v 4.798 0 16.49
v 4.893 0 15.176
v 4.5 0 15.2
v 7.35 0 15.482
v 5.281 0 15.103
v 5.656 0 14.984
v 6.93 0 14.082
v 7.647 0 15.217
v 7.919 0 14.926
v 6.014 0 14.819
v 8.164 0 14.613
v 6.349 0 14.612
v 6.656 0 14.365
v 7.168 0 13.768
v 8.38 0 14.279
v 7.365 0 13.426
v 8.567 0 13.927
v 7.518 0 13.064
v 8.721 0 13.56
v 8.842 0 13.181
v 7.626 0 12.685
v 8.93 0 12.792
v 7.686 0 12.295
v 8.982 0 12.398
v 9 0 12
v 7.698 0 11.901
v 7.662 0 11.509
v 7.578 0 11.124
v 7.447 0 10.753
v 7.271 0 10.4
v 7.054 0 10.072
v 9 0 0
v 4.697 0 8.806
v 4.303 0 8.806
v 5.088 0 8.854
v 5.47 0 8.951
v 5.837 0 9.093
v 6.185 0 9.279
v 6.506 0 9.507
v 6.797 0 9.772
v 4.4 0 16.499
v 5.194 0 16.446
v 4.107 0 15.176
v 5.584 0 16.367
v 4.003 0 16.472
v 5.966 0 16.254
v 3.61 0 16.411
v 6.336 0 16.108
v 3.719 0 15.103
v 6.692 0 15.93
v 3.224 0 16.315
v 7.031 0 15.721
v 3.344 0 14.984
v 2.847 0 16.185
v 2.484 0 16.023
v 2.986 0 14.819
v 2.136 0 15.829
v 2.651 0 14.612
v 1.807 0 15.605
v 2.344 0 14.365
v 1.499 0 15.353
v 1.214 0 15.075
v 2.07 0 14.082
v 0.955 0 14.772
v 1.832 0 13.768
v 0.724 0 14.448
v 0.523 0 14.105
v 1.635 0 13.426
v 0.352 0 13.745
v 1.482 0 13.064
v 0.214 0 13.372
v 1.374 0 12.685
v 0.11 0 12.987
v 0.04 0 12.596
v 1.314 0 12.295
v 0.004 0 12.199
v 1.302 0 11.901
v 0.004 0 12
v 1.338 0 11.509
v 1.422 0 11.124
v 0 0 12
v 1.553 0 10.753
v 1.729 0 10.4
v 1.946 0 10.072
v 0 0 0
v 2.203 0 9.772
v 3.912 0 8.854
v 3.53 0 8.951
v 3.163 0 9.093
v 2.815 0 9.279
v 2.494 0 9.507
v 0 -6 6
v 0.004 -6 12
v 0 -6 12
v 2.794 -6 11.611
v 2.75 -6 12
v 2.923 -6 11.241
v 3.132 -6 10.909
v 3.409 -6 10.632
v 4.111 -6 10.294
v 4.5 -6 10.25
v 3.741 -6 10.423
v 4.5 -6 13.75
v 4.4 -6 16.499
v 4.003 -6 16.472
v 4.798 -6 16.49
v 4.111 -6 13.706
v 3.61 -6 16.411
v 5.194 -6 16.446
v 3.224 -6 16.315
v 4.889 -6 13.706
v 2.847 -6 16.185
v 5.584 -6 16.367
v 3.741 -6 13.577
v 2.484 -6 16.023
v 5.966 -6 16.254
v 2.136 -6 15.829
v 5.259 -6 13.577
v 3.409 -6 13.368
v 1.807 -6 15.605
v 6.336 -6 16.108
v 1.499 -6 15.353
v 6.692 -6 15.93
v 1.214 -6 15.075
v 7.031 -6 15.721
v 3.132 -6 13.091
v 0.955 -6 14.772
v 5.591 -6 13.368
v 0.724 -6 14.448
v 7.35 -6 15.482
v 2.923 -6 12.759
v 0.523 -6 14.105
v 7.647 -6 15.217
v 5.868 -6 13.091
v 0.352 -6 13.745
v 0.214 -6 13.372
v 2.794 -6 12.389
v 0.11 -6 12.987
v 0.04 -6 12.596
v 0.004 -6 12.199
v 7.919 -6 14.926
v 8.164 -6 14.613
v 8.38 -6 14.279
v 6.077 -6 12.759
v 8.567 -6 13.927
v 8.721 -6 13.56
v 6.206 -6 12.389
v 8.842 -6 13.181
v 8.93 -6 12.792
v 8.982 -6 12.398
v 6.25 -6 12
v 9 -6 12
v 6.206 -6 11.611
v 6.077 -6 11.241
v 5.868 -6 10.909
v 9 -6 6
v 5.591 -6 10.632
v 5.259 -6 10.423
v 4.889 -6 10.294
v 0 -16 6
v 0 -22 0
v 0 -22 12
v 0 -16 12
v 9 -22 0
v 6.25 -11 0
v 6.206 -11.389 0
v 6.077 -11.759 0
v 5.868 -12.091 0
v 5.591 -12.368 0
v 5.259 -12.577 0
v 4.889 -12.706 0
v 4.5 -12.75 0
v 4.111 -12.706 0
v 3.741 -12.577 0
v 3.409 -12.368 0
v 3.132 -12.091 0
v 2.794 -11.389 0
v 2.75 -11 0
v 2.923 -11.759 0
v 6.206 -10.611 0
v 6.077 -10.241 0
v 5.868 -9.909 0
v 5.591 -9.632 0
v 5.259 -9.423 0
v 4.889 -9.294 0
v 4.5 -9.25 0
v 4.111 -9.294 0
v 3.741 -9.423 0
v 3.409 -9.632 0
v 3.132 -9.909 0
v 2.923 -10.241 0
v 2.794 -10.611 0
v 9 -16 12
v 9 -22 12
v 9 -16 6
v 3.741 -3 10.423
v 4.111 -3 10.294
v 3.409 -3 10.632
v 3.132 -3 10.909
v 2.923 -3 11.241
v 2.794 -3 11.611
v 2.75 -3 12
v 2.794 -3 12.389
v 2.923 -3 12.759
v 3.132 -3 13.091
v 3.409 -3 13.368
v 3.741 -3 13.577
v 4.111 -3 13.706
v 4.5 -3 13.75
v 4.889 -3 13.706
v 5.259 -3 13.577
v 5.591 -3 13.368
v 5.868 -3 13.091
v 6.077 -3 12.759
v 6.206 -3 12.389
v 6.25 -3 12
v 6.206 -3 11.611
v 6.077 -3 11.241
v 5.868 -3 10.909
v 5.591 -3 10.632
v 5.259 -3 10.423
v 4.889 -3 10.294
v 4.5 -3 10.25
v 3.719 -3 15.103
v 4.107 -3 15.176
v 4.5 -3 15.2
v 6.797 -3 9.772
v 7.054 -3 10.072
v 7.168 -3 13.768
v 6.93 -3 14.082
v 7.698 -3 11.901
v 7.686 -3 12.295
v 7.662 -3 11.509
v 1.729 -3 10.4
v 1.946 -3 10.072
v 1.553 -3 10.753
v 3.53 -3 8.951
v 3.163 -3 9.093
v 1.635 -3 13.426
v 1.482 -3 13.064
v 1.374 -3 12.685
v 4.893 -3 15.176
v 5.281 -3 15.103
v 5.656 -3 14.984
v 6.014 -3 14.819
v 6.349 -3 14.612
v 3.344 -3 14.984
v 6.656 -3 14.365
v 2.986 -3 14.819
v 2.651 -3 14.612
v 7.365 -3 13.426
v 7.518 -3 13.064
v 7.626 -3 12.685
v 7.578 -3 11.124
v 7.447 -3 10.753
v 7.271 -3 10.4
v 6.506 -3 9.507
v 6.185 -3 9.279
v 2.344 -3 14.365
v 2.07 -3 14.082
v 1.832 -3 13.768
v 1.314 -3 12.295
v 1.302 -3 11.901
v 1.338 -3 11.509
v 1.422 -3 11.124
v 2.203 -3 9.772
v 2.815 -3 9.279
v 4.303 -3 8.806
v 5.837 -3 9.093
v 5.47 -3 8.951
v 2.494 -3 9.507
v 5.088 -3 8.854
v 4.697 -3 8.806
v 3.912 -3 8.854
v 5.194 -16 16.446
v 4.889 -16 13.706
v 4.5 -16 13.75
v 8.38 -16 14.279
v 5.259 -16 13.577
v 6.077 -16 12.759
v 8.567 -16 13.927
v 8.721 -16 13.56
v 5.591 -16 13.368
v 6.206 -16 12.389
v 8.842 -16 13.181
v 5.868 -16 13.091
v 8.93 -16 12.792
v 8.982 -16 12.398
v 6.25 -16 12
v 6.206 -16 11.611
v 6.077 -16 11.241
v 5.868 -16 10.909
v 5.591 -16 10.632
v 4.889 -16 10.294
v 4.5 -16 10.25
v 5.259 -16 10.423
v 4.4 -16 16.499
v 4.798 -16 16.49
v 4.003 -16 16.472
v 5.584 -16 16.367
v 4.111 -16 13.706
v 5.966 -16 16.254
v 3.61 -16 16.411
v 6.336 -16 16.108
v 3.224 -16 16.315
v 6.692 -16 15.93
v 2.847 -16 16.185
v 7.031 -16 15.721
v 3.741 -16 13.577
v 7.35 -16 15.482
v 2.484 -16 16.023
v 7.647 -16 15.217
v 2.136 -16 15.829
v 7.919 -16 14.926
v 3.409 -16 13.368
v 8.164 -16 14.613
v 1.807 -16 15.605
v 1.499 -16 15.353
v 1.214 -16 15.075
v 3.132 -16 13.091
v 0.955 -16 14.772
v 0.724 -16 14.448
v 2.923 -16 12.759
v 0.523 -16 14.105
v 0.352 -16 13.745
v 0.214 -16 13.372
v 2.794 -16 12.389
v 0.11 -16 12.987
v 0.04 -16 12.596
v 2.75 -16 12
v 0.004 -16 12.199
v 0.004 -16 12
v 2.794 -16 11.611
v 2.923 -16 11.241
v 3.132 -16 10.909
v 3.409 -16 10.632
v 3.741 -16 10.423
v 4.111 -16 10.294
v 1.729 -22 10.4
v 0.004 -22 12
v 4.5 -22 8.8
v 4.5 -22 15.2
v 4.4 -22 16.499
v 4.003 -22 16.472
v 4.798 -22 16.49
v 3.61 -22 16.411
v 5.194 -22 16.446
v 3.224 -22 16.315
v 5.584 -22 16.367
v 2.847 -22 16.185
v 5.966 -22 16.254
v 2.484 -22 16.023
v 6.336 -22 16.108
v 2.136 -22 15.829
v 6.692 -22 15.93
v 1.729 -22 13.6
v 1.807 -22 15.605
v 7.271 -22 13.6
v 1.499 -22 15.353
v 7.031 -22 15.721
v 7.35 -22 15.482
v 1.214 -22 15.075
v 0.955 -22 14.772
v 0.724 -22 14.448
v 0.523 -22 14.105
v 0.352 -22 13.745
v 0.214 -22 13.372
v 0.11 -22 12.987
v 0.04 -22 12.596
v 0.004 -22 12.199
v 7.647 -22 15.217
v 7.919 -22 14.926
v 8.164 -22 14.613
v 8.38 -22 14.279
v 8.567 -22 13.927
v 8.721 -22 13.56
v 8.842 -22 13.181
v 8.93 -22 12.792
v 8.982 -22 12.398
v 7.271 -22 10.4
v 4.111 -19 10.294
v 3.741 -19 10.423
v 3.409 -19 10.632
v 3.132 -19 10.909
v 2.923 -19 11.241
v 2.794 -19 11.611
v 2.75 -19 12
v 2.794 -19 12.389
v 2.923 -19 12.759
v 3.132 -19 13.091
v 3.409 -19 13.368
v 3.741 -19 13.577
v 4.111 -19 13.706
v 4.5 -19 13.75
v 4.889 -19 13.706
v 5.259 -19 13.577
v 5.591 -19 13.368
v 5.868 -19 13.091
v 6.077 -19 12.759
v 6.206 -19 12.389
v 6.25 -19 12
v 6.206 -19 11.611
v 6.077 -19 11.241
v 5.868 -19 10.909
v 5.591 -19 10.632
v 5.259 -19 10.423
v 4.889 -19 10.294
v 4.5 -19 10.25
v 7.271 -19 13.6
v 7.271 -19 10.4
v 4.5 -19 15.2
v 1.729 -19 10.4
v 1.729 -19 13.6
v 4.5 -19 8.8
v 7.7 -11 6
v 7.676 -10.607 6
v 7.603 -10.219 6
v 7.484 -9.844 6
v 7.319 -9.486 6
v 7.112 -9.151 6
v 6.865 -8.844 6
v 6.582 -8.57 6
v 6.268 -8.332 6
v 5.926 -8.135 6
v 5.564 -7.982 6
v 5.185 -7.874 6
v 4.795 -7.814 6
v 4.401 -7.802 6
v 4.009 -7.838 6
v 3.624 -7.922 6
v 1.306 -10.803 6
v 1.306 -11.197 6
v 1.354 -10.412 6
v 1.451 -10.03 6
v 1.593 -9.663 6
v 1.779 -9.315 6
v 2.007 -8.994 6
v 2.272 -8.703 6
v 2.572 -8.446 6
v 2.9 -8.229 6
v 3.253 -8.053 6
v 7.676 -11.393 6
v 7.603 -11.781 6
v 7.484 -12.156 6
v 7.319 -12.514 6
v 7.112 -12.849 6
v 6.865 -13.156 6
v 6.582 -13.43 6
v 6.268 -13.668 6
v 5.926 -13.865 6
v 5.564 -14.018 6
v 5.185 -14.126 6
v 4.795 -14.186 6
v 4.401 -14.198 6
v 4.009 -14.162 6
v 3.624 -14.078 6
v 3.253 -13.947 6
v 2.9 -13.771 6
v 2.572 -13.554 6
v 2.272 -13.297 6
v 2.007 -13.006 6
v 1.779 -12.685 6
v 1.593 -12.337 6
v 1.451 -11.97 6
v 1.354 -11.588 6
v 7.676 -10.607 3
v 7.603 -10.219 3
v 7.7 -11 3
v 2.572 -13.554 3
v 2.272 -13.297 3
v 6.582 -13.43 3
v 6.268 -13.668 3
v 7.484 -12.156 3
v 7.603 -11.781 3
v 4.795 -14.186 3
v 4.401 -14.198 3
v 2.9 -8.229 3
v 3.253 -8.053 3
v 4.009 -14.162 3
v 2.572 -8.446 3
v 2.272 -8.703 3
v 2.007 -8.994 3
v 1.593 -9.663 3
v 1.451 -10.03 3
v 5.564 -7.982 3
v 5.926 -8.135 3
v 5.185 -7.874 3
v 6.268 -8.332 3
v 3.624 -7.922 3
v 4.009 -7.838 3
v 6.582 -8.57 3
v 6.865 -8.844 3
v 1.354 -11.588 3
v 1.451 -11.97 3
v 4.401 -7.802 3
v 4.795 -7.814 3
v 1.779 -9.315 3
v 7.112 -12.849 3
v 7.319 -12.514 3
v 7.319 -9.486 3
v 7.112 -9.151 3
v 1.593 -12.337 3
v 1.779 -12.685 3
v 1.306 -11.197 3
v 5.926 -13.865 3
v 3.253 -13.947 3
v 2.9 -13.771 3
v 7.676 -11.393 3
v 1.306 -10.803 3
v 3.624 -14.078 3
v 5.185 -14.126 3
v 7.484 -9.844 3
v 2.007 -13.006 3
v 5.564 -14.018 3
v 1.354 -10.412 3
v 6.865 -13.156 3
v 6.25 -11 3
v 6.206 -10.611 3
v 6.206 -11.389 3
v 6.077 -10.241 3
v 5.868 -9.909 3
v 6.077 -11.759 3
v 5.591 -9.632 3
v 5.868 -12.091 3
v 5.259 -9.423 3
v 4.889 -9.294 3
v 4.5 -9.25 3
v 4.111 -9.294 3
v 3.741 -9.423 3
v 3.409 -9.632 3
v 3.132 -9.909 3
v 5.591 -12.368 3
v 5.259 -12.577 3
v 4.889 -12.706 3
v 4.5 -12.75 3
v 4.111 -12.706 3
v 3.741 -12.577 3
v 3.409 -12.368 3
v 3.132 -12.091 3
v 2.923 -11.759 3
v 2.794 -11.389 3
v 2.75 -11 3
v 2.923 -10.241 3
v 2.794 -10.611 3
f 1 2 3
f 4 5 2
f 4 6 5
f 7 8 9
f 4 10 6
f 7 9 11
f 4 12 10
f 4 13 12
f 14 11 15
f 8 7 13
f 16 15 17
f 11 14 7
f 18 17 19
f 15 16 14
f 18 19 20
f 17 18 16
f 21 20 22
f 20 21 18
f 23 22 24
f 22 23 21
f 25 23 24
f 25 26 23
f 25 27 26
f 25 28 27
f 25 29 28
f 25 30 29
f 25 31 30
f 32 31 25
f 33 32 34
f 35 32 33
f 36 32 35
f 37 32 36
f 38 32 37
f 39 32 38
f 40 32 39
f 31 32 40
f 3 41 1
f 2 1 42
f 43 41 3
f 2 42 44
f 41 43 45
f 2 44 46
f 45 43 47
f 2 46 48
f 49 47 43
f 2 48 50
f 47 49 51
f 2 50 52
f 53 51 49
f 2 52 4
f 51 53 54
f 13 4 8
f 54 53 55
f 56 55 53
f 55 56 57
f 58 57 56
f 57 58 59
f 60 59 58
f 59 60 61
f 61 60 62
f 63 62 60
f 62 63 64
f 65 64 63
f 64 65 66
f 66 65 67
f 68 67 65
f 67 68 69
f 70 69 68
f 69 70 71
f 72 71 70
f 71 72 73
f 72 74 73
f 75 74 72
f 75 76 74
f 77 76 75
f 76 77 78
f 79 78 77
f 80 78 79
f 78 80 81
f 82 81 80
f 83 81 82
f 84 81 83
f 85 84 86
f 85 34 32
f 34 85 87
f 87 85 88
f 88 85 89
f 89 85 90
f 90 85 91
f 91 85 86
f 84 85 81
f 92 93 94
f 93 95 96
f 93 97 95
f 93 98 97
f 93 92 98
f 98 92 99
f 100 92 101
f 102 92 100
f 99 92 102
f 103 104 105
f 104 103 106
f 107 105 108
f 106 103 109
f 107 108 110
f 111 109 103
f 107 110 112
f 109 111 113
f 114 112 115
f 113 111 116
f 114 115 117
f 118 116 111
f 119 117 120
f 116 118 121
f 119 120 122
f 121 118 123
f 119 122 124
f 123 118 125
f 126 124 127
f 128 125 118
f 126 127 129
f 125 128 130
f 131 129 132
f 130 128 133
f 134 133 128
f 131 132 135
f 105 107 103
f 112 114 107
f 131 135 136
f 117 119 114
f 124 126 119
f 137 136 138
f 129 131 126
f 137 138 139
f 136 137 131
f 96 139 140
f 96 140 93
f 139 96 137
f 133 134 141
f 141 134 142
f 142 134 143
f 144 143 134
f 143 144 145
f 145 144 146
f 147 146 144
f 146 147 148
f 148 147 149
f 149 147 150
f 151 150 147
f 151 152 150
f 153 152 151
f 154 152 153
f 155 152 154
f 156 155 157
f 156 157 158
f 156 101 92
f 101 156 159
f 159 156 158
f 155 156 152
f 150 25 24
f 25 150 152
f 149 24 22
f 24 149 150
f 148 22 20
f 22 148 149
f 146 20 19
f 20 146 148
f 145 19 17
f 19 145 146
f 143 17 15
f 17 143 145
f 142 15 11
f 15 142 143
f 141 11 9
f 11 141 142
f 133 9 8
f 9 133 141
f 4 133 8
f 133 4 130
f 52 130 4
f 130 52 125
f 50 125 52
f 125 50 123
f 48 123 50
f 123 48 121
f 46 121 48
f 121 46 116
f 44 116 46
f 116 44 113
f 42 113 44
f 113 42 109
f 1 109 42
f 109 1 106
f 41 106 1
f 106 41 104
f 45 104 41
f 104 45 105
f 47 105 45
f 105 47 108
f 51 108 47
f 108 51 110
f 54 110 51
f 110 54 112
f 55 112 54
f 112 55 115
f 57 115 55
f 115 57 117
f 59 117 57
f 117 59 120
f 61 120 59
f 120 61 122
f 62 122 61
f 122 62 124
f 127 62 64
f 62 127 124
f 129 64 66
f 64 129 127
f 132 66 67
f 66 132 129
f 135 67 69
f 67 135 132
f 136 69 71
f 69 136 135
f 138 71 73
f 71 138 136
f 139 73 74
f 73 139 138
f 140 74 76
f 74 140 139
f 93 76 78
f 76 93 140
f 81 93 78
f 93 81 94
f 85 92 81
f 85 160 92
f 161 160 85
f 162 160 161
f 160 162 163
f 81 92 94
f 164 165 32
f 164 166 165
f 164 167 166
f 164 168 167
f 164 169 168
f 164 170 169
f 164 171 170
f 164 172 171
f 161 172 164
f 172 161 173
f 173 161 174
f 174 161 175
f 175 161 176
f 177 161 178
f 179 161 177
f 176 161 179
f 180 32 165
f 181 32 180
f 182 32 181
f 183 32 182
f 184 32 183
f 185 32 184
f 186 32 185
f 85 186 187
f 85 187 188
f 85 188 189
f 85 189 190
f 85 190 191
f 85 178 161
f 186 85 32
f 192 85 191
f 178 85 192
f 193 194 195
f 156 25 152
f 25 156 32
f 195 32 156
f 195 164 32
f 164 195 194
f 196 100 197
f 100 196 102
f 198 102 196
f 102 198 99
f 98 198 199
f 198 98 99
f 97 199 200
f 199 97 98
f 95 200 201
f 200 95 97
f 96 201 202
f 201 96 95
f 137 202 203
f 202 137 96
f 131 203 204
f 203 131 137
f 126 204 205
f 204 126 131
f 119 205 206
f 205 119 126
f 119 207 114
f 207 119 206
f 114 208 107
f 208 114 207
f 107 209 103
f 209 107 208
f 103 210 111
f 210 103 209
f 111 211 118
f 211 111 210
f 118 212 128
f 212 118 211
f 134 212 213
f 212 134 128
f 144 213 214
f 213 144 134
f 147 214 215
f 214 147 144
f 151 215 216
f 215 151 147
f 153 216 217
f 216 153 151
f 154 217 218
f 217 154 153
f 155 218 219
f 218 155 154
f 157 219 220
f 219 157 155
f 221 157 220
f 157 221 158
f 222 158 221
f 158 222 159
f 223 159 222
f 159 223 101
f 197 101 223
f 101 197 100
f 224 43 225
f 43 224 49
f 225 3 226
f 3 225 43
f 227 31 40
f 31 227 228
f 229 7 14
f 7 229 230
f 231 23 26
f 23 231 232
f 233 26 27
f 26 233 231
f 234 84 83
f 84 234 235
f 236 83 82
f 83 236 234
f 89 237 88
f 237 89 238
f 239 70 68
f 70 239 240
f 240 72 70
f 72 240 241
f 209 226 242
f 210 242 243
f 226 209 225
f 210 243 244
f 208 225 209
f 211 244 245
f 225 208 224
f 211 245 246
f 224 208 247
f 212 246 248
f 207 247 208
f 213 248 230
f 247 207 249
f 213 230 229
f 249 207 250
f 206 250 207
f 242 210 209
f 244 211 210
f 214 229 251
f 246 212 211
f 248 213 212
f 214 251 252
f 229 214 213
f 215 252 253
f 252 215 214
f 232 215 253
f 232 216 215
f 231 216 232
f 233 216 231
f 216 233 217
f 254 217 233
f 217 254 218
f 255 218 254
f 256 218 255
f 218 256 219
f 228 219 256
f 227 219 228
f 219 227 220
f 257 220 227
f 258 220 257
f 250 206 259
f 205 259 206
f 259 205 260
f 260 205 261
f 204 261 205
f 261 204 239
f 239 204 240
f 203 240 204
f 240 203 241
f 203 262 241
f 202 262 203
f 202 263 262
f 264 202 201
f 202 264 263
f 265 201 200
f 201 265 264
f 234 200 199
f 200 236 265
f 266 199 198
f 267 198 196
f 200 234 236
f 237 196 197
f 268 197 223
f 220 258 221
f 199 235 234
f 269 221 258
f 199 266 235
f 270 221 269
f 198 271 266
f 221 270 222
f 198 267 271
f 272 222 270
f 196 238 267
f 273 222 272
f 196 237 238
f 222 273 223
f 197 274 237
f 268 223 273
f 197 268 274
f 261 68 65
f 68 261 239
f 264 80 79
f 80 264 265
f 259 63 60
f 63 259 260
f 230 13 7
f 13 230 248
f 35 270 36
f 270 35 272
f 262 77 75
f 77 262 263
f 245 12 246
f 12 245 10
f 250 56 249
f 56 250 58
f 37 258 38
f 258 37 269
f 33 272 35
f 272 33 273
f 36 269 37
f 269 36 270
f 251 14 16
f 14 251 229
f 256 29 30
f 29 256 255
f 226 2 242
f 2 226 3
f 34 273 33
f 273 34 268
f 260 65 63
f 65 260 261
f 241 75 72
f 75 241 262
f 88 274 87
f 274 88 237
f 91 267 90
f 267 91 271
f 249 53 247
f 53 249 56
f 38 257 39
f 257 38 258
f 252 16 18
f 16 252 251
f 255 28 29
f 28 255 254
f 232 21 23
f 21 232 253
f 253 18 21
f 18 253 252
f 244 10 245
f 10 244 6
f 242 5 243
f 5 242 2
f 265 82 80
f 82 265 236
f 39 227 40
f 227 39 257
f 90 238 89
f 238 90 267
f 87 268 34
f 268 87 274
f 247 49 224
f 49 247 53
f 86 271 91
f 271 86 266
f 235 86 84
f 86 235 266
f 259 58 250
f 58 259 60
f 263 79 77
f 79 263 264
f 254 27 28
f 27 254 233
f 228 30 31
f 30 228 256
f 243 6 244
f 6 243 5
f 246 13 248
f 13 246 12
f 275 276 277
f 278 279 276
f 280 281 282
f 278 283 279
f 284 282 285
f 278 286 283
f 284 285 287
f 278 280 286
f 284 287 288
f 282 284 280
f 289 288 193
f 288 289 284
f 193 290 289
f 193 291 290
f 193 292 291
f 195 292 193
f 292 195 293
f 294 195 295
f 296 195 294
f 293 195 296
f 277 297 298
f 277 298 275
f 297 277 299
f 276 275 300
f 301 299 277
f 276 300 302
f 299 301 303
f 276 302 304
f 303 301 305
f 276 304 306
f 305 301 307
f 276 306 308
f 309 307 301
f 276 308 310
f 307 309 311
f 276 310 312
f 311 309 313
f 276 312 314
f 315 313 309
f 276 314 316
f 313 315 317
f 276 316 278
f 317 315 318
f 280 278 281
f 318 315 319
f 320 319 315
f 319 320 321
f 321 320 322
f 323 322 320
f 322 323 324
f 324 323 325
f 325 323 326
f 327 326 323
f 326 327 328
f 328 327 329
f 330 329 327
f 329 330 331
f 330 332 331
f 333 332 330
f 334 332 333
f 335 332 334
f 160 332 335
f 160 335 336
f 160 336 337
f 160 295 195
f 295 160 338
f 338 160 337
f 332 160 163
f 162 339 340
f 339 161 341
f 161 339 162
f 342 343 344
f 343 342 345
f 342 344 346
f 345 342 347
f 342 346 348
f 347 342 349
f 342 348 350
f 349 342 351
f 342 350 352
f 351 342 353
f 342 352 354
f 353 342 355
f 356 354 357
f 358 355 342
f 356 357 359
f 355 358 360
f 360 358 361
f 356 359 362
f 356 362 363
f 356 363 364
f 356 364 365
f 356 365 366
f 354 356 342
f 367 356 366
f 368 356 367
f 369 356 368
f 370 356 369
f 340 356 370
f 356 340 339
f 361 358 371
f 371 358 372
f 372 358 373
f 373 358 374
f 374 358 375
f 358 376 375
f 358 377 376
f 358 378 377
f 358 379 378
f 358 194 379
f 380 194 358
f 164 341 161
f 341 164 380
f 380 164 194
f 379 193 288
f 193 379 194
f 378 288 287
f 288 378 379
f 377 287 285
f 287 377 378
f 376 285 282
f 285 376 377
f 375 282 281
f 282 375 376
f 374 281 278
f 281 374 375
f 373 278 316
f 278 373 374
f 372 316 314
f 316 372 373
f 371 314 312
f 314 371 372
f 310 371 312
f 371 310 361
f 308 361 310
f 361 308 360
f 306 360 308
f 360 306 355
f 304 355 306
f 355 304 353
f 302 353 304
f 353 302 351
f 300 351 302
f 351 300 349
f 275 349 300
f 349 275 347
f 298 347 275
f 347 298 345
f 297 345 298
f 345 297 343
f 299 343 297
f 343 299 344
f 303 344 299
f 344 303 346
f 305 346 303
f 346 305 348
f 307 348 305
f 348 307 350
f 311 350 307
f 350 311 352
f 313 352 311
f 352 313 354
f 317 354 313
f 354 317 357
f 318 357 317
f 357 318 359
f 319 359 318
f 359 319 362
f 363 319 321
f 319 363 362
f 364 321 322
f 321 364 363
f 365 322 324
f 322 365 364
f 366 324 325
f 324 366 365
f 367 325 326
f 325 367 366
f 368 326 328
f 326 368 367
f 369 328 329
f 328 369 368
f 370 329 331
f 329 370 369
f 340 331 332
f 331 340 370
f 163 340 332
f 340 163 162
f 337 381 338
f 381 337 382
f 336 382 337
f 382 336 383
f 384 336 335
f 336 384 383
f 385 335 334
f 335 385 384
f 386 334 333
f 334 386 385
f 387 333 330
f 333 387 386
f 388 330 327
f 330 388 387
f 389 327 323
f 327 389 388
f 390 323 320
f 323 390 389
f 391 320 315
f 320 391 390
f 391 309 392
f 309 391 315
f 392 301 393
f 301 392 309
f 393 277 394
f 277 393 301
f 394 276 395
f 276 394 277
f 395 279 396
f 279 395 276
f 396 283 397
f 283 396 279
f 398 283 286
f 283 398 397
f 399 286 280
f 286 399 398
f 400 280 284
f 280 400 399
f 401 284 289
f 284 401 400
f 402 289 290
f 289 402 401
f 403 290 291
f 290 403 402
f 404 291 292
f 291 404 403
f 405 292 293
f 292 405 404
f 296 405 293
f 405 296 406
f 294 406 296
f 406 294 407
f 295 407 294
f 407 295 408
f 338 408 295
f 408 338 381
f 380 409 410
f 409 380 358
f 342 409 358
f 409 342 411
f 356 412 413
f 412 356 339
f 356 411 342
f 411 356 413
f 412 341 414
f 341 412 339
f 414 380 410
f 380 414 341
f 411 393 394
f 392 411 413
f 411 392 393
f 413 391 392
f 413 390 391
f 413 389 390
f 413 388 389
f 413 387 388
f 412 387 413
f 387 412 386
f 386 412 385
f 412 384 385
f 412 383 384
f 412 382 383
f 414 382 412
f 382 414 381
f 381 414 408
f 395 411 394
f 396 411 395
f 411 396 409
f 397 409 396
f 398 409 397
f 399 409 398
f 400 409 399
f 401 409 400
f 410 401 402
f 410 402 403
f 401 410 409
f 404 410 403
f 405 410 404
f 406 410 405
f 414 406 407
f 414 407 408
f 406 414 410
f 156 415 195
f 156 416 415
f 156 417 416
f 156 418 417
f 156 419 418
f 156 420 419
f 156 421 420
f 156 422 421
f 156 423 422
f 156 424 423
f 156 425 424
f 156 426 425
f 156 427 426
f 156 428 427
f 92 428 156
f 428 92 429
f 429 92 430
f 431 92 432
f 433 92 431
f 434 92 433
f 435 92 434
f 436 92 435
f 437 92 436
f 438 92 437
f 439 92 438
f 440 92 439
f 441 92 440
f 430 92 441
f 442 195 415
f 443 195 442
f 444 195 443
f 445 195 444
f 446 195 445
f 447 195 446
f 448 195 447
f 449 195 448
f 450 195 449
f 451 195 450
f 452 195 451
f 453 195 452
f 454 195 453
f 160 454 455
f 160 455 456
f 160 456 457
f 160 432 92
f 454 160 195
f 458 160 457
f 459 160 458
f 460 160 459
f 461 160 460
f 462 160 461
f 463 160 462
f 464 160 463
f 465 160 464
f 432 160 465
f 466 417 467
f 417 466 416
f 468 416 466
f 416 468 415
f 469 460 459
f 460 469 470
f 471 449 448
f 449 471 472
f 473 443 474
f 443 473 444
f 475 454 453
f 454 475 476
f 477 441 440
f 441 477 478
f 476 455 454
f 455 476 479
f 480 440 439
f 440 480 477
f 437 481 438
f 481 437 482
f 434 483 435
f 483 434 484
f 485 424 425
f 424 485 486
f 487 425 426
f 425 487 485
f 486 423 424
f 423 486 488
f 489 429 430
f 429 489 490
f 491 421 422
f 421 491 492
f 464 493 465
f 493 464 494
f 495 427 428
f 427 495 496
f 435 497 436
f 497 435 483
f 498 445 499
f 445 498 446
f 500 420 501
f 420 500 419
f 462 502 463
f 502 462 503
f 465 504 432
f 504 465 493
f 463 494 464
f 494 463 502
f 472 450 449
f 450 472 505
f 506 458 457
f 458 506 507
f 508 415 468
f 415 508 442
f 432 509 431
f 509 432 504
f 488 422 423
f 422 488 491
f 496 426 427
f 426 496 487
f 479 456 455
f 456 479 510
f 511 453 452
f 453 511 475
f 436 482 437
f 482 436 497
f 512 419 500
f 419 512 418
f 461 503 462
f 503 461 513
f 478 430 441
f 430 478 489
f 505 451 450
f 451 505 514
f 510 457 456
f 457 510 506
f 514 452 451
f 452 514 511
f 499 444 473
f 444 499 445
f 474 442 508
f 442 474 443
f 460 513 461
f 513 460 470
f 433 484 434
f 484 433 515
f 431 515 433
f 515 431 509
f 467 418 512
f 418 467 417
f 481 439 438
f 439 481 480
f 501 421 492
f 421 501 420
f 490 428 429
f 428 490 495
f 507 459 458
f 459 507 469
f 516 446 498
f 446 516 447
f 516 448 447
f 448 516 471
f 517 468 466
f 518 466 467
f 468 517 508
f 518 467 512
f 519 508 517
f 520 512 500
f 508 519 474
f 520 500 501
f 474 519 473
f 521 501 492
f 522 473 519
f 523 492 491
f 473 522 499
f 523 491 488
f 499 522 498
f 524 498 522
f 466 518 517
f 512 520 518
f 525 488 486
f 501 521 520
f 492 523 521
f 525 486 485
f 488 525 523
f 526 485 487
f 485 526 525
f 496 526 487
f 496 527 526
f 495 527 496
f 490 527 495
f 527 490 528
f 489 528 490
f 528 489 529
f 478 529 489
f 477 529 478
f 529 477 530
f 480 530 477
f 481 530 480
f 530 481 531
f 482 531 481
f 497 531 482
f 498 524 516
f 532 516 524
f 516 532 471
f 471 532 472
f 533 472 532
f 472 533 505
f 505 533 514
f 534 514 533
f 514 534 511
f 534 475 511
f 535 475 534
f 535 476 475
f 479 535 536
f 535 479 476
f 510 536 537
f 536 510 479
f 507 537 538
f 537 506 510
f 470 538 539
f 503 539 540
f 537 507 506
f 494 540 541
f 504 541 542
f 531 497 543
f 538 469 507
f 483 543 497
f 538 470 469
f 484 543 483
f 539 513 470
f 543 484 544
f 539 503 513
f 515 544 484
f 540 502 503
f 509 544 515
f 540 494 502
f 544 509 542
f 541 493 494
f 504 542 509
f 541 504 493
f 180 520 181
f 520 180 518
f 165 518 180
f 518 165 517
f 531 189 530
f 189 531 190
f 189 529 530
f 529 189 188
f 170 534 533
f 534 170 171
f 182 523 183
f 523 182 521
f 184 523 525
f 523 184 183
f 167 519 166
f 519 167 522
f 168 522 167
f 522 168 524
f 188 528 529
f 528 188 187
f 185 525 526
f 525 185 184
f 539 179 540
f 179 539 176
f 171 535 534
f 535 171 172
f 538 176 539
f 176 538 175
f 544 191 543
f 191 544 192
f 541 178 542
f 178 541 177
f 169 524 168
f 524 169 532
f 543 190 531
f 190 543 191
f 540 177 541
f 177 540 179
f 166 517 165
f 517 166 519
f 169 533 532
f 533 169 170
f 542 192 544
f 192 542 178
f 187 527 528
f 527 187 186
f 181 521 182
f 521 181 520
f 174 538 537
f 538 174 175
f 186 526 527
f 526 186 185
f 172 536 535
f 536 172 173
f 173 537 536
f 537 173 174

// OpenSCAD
//$fn=60;
$fa=5;
$fs=.4;

union(){
    side_part_head();
    translate([0,-16,0]) side_part_nut();
    translate([4.5,-11,3]) base();
}

module base(){
    difference(){
        cube([9,22,6],true);
        cylinder(d=6.4,h=3);
        translate([0,0,-3]) cylinder(d=3.5,h=6);
    }
}

module side_part_head(){
    rotate([90,0,0]) translate([4.5,6,0])
    difference(){
        side_part();    
        translate([0,6,0]) rotate([0,0,90]) cylinder(d=6.4,h=3);
    }  
}
 
module side_part_nut(){
    rotate([90,0,0]) translate([4.5,6,0])
    difference(){
        side_part();    
        translate([0,6,3]) rotate([0,0,90]) cylinder(d=6.4,h=3,$fn=6);
    }   
}

module side_part(){
    linear_extrude(height = 6) difference(){
        union(){
            square([9,12],true);
            translate([0,6,0]) circle(d=9);
        }
        translate([0,6,0]) circle(d=3.5);
    }
}
